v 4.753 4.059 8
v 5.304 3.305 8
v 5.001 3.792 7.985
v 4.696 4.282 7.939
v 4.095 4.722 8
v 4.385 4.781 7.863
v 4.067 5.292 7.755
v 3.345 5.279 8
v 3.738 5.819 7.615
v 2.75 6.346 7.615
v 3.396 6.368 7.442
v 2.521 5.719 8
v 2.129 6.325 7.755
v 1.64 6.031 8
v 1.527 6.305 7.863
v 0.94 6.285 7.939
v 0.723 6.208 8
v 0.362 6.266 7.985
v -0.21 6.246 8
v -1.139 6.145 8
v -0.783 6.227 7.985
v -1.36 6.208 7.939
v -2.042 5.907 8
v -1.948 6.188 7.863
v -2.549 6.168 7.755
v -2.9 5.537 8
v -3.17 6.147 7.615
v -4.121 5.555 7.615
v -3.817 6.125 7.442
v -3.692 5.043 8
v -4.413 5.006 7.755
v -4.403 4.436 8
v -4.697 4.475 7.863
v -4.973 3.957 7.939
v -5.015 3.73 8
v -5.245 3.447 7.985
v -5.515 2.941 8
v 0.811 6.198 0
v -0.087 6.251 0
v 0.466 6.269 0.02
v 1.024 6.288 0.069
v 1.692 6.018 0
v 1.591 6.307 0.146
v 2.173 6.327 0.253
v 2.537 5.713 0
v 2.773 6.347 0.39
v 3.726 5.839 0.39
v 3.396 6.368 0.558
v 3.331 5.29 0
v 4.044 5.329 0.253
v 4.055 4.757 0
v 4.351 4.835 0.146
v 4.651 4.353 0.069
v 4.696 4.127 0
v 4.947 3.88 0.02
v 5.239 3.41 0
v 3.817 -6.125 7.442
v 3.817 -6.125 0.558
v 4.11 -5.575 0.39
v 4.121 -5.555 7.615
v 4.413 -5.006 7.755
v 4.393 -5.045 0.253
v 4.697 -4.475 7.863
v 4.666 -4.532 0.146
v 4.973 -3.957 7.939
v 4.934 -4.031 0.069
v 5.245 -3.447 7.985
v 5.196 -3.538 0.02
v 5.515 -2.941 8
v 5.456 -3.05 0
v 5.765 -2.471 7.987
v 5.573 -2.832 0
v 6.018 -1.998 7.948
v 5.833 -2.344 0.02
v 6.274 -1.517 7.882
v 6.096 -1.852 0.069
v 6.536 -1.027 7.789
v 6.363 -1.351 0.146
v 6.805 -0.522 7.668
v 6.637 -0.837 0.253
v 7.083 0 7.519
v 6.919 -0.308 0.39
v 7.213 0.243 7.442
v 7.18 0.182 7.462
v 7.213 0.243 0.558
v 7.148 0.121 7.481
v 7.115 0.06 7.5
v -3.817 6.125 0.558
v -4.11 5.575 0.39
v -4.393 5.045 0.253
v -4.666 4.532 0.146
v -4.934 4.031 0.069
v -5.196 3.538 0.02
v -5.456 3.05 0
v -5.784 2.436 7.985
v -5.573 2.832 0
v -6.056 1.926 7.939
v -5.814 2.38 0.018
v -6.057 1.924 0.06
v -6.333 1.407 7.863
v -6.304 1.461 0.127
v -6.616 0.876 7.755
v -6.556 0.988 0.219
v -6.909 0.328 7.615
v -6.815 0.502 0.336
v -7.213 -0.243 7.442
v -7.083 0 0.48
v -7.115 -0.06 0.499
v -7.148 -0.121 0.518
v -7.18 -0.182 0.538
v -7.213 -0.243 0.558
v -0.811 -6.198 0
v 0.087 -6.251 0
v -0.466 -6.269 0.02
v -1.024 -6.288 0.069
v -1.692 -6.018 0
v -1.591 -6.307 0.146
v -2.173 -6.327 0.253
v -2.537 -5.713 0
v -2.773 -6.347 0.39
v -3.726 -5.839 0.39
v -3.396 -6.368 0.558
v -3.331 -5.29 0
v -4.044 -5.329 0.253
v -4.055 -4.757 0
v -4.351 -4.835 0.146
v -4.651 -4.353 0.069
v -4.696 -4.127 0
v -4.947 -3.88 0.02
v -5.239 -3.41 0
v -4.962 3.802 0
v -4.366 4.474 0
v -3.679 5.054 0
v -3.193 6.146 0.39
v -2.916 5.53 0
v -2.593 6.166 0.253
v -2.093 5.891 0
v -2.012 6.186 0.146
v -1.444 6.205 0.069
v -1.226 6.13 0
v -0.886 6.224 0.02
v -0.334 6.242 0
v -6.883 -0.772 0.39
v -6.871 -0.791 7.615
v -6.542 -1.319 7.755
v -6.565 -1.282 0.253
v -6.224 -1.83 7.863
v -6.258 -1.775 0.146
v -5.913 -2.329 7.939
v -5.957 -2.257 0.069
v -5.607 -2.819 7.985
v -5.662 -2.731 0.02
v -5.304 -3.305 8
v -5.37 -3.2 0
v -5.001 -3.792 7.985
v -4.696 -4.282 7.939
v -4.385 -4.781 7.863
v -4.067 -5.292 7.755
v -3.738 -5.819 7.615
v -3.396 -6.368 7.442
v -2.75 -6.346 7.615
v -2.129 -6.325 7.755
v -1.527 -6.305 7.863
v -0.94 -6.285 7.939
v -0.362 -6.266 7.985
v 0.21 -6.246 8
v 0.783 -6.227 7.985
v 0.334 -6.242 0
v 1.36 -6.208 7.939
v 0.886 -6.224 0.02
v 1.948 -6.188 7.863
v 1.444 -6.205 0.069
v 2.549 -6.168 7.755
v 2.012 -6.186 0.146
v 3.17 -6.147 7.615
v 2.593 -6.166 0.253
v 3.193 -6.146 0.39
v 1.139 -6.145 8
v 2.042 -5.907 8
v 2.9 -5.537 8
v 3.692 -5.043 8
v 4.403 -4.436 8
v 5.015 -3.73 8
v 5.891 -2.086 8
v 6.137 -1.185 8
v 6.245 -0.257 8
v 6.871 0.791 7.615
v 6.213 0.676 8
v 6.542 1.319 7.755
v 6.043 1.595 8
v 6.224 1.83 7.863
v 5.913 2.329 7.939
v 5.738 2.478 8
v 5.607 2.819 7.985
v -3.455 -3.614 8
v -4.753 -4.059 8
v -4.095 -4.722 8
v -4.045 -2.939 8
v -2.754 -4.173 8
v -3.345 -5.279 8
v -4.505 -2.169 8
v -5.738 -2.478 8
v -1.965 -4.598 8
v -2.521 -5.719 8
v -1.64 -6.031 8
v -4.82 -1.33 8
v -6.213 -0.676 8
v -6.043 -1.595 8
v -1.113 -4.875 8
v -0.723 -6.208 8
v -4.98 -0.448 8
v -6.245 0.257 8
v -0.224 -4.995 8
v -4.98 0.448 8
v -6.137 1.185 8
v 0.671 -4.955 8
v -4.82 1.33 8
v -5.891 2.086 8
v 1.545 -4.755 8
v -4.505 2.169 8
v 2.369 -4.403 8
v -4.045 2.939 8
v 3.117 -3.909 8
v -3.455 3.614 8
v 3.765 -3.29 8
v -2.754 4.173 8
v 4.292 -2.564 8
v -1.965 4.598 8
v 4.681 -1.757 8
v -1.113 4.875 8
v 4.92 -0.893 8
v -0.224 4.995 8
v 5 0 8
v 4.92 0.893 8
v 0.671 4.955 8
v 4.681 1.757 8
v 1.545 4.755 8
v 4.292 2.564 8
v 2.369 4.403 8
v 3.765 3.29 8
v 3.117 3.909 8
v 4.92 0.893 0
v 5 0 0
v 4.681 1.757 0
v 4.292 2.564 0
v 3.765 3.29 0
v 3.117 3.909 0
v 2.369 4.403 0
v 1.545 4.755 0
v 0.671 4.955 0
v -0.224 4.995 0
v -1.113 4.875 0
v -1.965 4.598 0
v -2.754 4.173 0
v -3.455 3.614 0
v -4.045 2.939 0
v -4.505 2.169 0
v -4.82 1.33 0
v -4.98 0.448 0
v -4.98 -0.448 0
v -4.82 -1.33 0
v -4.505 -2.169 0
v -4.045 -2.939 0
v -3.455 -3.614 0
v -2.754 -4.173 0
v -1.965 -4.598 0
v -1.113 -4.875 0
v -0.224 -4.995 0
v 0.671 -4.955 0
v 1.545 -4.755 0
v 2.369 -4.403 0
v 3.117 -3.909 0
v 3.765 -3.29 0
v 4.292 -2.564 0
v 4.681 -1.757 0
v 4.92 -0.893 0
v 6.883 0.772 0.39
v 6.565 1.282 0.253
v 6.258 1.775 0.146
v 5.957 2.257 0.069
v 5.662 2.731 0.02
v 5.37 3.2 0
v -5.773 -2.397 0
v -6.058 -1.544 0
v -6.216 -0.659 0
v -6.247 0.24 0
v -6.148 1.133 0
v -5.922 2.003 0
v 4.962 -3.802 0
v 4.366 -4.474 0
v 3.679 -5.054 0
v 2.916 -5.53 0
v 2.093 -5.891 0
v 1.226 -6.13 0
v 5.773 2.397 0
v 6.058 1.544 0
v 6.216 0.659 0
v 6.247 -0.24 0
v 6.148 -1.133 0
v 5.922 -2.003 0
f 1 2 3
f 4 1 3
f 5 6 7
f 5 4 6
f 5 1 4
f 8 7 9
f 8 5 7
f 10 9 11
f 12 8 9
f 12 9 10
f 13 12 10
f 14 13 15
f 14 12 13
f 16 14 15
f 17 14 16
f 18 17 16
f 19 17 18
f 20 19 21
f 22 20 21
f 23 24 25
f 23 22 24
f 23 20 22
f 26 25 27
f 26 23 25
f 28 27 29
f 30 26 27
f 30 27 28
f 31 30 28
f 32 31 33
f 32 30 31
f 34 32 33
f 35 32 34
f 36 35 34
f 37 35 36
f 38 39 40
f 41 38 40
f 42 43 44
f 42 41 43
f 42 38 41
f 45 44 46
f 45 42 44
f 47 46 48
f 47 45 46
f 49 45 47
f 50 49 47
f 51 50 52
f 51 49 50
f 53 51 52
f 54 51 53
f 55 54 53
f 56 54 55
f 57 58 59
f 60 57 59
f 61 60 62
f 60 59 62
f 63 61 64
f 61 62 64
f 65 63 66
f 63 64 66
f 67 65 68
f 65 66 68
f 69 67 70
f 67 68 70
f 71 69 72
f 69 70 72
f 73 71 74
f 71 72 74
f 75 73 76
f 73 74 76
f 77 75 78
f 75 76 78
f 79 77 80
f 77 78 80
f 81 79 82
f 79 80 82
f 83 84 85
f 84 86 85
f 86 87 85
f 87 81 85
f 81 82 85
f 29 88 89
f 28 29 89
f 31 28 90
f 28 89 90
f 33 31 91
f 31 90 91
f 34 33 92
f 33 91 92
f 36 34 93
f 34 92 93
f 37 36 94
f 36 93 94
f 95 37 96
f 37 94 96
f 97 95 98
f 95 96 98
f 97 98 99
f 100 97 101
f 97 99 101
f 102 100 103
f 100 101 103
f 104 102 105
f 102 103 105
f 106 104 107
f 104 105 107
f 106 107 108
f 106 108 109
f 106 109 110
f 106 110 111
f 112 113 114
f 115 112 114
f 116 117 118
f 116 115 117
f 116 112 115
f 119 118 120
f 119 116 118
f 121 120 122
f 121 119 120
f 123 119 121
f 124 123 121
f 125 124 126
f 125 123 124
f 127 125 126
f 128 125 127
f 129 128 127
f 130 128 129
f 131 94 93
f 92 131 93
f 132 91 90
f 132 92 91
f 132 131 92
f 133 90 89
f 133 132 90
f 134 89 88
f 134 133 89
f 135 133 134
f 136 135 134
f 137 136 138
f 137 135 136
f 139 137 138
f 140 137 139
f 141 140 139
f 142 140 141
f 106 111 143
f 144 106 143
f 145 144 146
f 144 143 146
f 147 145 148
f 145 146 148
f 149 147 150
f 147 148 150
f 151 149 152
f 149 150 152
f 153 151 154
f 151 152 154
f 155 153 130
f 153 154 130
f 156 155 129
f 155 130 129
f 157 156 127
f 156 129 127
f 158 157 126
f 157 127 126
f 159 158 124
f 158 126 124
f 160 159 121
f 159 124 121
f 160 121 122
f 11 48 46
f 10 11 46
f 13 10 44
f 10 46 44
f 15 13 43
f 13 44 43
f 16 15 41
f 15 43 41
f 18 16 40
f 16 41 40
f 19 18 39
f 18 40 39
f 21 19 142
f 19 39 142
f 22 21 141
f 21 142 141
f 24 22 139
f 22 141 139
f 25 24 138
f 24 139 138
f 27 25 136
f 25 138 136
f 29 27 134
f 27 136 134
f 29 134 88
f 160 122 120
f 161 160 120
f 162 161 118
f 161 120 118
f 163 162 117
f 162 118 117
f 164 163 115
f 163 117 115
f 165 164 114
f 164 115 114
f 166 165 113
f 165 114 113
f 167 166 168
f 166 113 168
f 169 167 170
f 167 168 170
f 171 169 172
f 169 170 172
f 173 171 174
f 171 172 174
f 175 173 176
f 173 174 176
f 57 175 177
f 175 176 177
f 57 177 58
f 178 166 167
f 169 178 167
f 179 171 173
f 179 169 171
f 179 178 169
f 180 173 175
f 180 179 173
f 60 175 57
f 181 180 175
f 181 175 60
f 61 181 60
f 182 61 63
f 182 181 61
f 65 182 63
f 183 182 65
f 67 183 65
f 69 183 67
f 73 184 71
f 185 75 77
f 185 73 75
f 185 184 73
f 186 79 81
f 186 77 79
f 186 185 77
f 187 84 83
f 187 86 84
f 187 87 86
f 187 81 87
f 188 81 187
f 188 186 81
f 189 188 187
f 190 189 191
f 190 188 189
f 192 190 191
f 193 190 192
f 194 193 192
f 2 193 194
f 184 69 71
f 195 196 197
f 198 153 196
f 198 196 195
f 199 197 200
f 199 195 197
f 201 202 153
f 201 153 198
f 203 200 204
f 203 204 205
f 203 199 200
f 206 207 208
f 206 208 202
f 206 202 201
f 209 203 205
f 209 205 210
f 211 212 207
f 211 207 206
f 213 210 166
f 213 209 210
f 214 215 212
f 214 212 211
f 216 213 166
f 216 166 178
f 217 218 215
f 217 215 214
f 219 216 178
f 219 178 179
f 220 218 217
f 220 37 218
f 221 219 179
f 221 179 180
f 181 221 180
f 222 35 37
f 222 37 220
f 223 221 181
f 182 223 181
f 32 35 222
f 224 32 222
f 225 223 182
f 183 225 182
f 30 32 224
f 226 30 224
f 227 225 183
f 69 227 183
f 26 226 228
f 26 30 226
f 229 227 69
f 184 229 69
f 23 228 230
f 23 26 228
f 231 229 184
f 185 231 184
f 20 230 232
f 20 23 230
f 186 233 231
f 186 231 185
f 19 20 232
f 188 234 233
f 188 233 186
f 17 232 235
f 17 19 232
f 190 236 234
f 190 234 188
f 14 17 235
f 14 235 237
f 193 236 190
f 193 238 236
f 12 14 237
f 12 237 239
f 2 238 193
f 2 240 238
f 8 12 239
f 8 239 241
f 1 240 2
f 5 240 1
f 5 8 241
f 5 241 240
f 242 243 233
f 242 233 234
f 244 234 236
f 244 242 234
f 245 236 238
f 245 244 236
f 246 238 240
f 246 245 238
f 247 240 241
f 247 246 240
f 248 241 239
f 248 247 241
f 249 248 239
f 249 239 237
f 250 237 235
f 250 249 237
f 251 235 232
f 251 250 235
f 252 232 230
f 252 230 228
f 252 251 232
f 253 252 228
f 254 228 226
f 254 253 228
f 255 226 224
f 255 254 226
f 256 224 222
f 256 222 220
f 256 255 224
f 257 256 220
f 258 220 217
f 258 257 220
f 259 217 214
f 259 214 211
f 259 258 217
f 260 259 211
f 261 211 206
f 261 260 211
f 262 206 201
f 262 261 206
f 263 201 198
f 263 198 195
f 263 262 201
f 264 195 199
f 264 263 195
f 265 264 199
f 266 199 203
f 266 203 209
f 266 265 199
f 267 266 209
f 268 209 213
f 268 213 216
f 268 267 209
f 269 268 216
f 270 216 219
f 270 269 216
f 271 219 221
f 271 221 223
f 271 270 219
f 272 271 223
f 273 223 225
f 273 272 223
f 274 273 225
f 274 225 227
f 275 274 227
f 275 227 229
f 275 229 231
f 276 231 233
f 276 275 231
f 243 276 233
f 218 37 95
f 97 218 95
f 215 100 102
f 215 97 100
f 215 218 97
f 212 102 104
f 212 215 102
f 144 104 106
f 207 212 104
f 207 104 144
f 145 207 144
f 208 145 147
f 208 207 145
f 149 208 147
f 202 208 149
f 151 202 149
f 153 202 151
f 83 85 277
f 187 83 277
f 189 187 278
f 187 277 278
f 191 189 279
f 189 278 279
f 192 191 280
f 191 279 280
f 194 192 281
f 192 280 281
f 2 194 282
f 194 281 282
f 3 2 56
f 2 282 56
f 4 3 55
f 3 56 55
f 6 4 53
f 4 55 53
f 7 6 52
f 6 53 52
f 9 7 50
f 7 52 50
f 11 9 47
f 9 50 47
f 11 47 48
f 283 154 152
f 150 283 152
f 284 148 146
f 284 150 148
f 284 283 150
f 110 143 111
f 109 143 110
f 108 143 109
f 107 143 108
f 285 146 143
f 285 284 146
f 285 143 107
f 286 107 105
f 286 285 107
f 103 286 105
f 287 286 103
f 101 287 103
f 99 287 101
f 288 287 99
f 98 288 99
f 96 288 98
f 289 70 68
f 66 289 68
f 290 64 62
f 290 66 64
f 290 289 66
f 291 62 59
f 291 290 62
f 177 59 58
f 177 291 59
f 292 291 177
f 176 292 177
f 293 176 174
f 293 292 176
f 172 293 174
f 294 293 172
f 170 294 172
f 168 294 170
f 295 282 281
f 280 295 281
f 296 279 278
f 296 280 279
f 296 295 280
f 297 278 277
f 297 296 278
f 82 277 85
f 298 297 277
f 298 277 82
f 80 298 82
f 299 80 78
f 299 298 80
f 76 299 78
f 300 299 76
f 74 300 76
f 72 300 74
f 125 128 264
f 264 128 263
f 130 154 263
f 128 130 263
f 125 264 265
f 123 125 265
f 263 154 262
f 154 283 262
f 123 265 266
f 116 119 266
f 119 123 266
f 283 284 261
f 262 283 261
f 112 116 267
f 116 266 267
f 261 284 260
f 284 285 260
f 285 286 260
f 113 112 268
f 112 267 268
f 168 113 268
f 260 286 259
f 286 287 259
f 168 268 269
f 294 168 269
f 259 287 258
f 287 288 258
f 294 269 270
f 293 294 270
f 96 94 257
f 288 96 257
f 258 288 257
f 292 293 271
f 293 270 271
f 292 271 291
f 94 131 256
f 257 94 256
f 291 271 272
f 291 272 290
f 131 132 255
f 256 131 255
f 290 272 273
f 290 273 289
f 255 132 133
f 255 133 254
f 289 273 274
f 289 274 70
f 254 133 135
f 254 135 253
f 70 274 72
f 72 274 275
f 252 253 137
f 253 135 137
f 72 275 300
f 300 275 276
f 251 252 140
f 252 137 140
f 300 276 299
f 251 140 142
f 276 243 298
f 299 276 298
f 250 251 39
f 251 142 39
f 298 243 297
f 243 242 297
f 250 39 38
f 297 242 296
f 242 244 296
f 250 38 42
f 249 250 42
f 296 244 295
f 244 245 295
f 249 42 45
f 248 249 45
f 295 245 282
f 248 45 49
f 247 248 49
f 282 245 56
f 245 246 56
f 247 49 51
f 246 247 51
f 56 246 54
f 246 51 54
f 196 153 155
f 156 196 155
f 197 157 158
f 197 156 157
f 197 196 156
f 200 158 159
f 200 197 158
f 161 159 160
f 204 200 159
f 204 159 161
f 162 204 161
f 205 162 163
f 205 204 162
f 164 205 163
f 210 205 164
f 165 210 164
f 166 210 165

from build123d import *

# Parameters (mm, degrees)
SKETCH1_R           = 5
BOSS_EXTRUDE1_DEPTH = 8
SKETCH2_OUTSIDE_W   = 67.404
SKETCH2_OUTSIDE_H   = 65.714
SKETCH2_OUTSIDE_R   = 6.25
CUT_EXTRUDE1_DEPTH  = 13.512942035
CUT_EXTRUDE1_DRAFT  = -60
SKETCH3_OUTSIDE_W   = 67.404
SKETCH3_OUTSIDE_H   = 65.714
SKETCH3_OUTSIDE_R   = 6.251224569
CUT_EXTRUDE2_DEPTH  = 13.512942035
CUT_EXTRUDE2_DRAFT  = -60


with BuildPart() as part:
    # Sketch1 → Boss-Extrude1 (new body)
    with BuildSketch(Plane.XY):
        Polygon((3.396178054, 6.367833851), (-3.816616855, 6.125093396), (-7.212794909, -0.242740455), (-3.396178054, -6.367833851), (3.816616855, -6.125093396), (7.212794909, 0.242740455), align=None)
        Circle(SKETCH1_R, mode=Mode.SUBTRACT)
    extrude(amount=BOSS_EXTRUDE1_DEPTH)


with BuildPart() as cut_extrude1_tool:
    # Sketch2 outside → Cut-Extrude1 (with draft: the straight prism first)
    with BuildSketch(Plane.XY.offset(8)):
        Rectangle(SKETCH2_OUTSIDE_W, SKETCH2_OUTSIDE_H)
        Circle(SKETCH2_OUTSIDE_R, mode=Mode.SUBTRACT)
    extrude(amount=-CUT_EXTRUDE1_DEPTH)
    # Cut-Extrude1: the draft: its side faces are tilted about the plane it starts from
    cut_extrude1_sides = [cut_extrude1_tool.faces().sort_by_distance(p)[0] for p in [
        (0, -32.857, 1.243528983),
        (33.702, 0, 1.243528983),
        (0, 32.857, 1.243528983),
        (-33.702, 0, 1.243528983),
        (-6.25, 0, 1.243528983),
    ]]
    draft(cut_extrude1_sides, Plane.XY.offset(8), CUT_EXTRUDE1_DRAFT)


with BuildPart() as part_1:
    add(part.part)

    # Cut-Extrude1: cut by cut_extrude1_tool
    add(cut_extrude1_tool.part, mode=Mode.SUBTRACT)


with BuildPart() as cut_extrude2_tool:
    # Sketch3 outside → Cut-Extrude2 (with draft: the straight prism first)
    with BuildSketch(Plane(origin=(0, 0, 0), x_dir=(-1, 0, 0), z_dir=(0, 0, -1))):
        Rectangle(SKETCH3_OUTSIDE_W, SKETCH3_OUTSIDE_H)
        Circle(SKETCH3_OUTSIDE_R, mode=Mode.SUBTRACT)
    extrude(amount=-CUT_EXTRUDE2_DEPTH)
    # Cut-Extrude2: the draft: its side faces are tilted about the plane it starts from
    cut_extrude2_sides = [cut_extrude2_tool.faces().sort_by_distance(p)[0] for p in [
        (0, -32.857, 6.756471017),
        (-33.702, 0, 6.756471017),
        (0, 32.857, 6.756471017),
        (33.702, 0, 6.756471017),
        (6.251224569, 0, 6.756471017),
    ]]
    draft(cut_extrude2_sides, Plane(origin=(0, 0, 0), x_dir=(-1, 0, 0), z_dir=(0, 0, -1)), CUT_EXTRUDE2_DRAFT)


with BuildPart() as part_2:
    add(part_1.part)

    # Cut-Extrude2: cut by cut_extrude2_tool
    add(cut_extrude2_tool.part, mode=Mode.SUBTRACT)


solid = part_2.part
